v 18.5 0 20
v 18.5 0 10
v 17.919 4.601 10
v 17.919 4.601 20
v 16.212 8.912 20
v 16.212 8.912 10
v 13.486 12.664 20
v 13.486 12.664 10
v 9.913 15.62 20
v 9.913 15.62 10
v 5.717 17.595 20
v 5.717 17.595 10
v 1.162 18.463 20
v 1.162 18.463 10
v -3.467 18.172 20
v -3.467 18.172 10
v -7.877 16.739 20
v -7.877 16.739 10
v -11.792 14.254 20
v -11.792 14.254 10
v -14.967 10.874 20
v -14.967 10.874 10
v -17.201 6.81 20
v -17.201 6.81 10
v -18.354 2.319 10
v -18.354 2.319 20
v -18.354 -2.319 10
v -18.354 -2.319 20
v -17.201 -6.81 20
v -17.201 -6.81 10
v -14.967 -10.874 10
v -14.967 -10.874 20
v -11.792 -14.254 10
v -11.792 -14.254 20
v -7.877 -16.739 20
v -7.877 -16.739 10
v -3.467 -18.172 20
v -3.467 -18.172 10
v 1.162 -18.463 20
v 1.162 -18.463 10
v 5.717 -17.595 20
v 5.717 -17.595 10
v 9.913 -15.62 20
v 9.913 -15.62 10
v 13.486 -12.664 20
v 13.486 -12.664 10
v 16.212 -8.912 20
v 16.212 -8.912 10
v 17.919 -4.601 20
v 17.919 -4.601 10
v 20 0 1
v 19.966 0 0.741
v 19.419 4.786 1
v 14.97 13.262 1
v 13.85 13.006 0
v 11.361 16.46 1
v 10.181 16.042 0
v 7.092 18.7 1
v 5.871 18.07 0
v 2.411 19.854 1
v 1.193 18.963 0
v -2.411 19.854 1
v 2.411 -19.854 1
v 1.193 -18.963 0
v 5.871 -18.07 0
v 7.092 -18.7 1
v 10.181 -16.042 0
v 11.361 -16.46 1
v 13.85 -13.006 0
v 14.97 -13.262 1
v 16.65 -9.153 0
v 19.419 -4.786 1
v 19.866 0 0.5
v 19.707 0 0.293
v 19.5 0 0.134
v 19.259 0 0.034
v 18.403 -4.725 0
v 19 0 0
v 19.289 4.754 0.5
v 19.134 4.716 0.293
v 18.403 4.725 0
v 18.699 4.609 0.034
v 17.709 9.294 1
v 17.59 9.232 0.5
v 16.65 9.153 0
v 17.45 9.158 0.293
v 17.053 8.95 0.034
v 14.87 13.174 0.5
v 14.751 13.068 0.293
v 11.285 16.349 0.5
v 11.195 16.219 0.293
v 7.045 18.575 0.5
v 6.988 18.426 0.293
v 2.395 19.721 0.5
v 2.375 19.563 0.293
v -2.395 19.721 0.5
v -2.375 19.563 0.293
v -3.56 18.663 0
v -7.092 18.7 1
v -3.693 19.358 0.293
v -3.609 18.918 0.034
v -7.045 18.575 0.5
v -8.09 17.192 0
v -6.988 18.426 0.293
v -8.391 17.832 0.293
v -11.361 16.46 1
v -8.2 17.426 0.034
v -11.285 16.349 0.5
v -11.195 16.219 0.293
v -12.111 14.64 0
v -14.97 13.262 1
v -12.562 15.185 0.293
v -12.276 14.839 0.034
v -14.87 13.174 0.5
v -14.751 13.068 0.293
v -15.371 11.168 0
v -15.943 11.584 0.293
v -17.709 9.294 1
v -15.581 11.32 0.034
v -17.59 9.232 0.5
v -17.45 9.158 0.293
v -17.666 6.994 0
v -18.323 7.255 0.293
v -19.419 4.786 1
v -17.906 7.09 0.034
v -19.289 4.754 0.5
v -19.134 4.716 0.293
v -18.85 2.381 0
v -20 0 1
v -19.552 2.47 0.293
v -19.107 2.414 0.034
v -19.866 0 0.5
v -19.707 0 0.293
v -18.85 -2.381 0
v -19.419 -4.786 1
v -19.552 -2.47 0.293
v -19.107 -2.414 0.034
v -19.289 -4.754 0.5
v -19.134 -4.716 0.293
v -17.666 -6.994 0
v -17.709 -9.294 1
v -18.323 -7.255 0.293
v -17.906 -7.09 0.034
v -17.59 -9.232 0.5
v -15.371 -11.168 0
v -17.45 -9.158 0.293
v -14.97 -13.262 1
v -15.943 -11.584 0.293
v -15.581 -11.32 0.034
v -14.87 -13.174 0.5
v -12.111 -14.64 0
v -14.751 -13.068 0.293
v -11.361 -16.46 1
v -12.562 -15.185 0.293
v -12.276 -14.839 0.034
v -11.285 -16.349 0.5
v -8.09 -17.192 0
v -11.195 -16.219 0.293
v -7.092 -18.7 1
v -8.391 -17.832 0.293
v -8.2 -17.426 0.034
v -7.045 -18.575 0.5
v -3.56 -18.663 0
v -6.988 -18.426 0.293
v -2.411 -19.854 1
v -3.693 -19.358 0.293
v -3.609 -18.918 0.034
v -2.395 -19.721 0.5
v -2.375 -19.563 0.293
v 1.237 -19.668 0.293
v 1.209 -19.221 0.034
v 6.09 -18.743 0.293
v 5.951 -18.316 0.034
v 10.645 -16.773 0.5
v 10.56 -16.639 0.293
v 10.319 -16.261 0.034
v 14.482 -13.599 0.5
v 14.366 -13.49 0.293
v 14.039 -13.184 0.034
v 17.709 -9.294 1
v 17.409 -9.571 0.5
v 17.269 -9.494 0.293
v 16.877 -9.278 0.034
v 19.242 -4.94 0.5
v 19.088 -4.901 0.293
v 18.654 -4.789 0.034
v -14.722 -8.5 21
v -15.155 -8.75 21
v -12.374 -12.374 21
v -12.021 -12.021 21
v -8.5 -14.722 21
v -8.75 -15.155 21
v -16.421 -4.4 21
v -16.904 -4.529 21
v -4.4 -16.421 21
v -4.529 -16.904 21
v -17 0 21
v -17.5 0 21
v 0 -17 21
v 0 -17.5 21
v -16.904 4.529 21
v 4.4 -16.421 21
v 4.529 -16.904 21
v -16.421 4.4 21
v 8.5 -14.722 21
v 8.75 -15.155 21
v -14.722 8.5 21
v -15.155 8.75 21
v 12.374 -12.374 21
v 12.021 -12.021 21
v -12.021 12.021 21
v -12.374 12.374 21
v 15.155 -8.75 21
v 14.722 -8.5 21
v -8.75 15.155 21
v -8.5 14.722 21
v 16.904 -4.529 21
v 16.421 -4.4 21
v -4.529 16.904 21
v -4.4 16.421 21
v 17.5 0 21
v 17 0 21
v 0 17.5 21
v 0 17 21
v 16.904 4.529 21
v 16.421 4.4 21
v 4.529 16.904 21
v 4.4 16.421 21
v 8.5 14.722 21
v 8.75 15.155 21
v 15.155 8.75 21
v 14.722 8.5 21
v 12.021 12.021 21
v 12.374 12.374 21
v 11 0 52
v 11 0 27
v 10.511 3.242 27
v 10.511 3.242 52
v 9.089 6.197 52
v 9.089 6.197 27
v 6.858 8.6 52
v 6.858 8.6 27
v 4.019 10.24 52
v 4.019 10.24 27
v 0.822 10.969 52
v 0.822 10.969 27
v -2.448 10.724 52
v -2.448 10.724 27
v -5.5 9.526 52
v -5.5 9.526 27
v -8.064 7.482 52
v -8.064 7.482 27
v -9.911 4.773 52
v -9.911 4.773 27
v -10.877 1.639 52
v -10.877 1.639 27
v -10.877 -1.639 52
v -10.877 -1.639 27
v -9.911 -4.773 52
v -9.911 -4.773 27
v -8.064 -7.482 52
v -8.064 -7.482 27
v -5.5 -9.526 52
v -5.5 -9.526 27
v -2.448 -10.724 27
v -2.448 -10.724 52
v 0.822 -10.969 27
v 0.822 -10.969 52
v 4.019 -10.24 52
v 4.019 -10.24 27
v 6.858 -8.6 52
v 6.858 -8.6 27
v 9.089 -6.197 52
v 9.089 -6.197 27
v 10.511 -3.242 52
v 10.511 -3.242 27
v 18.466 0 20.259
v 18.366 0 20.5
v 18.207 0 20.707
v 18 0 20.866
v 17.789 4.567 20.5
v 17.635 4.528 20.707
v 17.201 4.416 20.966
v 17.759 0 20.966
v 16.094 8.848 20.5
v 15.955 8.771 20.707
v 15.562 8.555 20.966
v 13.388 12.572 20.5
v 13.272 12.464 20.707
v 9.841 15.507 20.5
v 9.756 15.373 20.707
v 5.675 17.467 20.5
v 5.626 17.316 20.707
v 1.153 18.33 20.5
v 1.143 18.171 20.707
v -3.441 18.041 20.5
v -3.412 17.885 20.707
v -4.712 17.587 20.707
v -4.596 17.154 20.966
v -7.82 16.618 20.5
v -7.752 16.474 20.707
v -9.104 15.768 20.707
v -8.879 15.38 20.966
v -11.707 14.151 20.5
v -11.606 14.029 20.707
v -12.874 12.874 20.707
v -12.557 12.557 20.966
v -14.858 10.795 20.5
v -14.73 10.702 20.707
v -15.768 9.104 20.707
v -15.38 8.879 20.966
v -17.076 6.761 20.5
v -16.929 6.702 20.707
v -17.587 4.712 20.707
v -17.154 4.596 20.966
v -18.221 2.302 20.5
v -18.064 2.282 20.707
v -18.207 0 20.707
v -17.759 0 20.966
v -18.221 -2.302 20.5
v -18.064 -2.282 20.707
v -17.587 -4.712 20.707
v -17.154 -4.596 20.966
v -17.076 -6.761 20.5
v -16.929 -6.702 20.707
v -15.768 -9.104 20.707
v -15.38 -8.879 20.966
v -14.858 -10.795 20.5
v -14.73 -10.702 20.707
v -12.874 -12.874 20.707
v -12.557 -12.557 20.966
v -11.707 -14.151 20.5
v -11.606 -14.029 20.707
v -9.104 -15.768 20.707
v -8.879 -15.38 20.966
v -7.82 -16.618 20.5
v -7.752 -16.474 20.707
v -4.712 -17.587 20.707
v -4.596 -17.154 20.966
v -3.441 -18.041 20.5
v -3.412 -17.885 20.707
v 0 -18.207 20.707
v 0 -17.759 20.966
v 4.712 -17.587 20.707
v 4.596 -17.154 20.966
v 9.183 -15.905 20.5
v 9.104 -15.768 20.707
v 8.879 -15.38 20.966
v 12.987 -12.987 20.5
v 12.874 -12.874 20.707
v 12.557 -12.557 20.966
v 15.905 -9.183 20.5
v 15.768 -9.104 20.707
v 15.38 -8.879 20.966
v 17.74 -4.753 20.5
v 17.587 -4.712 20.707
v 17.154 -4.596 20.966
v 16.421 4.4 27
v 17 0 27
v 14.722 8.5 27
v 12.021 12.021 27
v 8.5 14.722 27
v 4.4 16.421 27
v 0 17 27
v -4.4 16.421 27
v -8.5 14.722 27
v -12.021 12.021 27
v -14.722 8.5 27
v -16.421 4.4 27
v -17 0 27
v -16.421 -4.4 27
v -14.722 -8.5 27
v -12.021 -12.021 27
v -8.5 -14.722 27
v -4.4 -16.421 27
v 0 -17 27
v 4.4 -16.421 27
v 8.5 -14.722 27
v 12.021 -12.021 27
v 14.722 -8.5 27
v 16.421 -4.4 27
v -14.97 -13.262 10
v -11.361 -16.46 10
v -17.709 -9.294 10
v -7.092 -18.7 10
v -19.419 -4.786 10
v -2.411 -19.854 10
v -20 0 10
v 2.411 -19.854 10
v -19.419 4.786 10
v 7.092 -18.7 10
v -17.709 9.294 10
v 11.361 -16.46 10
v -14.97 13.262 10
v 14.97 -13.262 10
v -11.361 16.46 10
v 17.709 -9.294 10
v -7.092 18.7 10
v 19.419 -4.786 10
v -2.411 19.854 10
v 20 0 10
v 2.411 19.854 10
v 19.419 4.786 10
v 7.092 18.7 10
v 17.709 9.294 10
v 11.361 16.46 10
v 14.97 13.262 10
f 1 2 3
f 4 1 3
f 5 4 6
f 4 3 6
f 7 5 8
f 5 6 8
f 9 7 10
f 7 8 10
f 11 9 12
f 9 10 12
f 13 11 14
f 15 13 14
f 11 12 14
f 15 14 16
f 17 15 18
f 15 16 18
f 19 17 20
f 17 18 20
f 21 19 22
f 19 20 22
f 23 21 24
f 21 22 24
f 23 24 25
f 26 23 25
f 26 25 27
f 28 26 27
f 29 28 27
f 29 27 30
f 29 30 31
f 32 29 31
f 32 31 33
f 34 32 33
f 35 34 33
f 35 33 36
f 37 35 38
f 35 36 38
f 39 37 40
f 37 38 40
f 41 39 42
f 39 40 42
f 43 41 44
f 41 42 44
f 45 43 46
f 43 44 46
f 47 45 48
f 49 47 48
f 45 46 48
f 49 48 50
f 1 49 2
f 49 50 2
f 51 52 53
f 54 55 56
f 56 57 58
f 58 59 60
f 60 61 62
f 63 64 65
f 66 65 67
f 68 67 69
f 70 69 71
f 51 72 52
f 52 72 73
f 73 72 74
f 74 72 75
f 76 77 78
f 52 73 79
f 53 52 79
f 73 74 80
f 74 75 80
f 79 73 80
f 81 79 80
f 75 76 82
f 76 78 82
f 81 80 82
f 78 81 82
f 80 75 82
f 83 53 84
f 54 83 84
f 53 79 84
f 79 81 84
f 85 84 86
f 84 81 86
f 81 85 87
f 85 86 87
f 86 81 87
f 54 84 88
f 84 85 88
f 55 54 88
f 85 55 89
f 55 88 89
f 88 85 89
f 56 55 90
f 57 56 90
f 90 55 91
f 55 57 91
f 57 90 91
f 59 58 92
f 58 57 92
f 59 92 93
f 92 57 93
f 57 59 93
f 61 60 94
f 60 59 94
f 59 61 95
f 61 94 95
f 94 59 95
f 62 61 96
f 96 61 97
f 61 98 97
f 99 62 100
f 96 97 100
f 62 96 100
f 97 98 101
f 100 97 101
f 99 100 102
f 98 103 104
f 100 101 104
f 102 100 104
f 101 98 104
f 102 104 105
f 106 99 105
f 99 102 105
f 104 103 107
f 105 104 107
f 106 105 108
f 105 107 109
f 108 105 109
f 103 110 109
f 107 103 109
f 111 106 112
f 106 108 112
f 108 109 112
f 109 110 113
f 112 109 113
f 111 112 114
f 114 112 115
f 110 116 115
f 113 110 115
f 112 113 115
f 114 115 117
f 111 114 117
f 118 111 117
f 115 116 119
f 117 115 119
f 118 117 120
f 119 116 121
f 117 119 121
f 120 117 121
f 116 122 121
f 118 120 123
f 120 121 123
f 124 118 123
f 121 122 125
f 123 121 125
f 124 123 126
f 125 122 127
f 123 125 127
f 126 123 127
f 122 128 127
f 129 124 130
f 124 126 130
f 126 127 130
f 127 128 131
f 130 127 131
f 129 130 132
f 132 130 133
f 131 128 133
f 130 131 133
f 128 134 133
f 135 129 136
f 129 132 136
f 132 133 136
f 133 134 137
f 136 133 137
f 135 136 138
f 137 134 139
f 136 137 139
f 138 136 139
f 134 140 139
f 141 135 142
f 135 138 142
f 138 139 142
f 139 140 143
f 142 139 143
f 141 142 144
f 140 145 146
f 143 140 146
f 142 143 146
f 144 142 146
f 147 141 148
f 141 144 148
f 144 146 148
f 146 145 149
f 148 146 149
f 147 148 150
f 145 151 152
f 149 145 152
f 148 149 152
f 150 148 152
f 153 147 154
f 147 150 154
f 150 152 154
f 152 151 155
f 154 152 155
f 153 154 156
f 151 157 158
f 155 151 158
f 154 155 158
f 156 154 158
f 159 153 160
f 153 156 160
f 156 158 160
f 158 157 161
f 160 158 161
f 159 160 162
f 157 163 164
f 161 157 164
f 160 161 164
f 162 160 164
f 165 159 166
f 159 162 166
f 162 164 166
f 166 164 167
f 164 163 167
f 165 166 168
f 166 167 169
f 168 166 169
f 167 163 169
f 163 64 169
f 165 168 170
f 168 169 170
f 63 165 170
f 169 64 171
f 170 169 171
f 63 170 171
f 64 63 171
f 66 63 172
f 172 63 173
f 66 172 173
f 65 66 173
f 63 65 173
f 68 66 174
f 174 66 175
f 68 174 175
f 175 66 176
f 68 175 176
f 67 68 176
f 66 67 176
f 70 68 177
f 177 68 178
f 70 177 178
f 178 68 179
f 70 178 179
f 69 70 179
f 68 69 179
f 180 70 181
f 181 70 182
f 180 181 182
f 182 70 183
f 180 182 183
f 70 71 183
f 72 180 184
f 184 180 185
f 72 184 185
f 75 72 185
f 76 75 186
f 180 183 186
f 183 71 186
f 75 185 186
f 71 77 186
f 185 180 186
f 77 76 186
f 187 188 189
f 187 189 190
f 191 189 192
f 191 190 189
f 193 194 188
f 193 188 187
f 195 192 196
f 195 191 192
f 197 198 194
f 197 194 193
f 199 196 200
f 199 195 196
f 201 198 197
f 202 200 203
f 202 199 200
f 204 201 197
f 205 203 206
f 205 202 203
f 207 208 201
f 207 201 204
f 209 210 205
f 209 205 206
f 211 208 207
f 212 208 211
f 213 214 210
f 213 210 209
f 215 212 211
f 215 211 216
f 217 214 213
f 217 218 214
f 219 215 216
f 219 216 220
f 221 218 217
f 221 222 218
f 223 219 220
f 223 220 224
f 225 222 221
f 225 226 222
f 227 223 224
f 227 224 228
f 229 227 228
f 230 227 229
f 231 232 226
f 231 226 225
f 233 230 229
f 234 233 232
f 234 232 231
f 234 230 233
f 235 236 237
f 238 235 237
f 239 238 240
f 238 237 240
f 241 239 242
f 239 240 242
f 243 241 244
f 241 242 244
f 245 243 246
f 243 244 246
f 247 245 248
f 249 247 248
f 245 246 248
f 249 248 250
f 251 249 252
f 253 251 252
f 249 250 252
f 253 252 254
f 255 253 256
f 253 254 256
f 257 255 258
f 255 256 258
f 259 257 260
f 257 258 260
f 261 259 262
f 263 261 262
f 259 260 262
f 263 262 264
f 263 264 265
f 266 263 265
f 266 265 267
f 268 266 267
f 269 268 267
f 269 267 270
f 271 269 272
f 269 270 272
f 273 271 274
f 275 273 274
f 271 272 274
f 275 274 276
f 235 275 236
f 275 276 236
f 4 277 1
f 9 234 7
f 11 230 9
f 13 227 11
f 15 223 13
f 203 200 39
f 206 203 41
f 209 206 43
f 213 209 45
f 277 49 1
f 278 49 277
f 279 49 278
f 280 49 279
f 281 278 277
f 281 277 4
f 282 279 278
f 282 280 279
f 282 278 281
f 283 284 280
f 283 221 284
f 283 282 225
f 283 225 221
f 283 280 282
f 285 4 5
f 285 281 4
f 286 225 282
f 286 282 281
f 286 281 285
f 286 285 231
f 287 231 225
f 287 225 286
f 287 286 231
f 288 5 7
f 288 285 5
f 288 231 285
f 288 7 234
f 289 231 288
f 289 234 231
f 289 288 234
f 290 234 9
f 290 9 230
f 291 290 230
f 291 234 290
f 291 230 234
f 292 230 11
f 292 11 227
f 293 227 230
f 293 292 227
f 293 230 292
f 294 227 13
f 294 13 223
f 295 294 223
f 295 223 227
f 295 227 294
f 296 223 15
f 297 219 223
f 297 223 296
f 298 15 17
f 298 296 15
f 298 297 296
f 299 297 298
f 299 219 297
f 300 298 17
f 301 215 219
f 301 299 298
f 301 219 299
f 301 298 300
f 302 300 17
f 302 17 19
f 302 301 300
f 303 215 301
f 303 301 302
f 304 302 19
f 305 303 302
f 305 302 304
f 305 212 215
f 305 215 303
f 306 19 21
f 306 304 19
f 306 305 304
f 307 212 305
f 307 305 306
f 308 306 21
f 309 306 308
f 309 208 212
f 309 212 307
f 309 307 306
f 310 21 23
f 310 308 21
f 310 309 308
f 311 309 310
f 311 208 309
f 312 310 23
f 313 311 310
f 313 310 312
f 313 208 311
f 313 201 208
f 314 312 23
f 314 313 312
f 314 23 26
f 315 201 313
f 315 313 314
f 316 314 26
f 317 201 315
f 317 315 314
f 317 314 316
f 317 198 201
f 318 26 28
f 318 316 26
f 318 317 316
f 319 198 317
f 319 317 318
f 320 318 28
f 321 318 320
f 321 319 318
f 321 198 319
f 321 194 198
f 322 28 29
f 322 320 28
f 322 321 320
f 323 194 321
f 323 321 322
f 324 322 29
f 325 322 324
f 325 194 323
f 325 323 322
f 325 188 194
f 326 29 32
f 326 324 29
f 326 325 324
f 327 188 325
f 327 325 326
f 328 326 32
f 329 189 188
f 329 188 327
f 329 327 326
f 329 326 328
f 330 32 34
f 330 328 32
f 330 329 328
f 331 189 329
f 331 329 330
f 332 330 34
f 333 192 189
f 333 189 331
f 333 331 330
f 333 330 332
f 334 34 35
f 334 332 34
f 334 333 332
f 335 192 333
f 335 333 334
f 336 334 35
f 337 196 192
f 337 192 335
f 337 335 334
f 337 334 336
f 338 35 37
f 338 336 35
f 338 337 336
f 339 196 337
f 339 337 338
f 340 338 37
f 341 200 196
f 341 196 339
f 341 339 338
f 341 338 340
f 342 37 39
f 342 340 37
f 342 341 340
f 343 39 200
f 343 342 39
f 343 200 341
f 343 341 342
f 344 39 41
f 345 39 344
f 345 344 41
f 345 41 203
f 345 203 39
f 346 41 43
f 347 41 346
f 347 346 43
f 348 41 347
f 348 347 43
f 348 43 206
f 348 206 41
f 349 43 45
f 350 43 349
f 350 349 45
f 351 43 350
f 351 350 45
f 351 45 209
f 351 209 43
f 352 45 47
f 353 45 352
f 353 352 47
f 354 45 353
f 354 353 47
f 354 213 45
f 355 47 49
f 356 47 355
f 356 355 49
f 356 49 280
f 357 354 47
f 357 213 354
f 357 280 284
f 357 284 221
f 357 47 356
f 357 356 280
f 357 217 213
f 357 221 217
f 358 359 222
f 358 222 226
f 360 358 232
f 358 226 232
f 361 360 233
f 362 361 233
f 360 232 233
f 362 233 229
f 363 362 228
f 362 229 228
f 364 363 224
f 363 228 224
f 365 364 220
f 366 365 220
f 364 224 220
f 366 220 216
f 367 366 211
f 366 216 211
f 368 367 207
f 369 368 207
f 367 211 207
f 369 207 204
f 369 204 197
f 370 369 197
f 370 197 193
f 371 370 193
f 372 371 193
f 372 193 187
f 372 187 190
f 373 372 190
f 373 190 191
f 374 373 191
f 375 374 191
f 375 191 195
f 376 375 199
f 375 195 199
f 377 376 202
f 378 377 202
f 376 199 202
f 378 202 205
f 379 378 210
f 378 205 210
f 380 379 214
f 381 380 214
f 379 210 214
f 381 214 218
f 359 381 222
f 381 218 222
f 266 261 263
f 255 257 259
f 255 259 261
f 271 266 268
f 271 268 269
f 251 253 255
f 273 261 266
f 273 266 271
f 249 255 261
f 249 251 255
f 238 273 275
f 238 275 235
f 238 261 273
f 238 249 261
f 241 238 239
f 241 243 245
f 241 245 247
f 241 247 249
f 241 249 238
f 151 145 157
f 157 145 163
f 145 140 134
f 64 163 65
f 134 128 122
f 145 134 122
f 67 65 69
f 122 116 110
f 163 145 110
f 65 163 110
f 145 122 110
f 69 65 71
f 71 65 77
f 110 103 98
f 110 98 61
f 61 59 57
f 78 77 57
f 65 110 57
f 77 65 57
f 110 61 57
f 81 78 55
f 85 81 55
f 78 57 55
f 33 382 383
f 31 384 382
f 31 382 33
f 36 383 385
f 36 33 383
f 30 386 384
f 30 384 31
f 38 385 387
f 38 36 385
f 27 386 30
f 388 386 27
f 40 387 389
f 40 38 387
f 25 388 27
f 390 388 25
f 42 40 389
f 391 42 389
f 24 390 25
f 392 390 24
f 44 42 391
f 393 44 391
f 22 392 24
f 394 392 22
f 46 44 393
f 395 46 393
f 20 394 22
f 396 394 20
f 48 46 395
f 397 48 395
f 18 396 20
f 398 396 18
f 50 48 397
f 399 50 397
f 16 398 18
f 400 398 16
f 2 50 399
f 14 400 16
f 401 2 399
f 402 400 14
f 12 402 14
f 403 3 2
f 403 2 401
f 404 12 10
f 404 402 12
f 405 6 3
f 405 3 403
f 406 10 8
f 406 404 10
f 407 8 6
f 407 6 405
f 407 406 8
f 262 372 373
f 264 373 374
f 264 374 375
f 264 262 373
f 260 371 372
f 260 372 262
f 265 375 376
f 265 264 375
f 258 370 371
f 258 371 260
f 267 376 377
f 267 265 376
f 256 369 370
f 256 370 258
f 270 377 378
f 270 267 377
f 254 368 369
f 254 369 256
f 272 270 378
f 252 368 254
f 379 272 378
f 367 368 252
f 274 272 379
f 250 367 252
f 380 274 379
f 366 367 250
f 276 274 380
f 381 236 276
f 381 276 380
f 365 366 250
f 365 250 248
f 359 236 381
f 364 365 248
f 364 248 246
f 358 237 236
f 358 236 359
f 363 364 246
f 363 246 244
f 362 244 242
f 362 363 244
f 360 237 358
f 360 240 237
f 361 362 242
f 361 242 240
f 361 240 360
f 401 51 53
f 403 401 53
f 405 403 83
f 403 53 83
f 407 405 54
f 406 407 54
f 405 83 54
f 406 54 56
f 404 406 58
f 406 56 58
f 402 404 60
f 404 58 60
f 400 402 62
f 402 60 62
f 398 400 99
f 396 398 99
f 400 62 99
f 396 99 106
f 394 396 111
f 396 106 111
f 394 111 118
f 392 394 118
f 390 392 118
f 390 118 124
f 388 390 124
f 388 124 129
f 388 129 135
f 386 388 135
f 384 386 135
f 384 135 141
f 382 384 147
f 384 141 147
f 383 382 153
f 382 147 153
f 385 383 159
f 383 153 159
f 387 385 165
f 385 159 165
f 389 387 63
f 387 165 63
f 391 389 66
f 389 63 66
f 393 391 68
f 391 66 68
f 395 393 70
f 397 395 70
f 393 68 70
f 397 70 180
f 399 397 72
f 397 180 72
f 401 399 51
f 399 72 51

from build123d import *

# Parameters (mm, degrees)
SKETCH1_R           = 20
BOSS_EXTRUDE1_DEPTH = 10
SKETCH2_R           = 18.5
BOSS_EXTRUDE2_DEPTH = 11
SKETCH3_R           = 17
BOSS_EXTRUDE3_DEPTH = 6
SKETCH4_R           = 11
BOSS_EXTRUDE4_DEPTH = 25
FILLET1_R           = 1


with BuildPart() as part:
    # Sketch1 → Boss-Extrude1 (new body)
    with BuildSketch(Plane.XY):
        Circle(SKETCH1_R)
    extrude(amount=BOSS_EXTRUDE1_DEPTH)

    # Sketch2 → Boss-Extrude2 (add)
    with BuildSketch(Plane.XY.offset(10)):
        Circle(SKETCH2_R)
    extrude(amount=BOSS_EXTRUDE2_DEPTH)

    # Sketch3 → Boss-Extrude3 (add)
    with BuildSketch(Plane.XY.offset(21)):
        Circle(SKETCH3_R)
    extrude(amount=BOSS_EXTRUDE3_DEPTH)

    # Sketch4 → Boss-Extrude4 (add)
    with BuildSketch(Plane.XY.offset(27)):
        Circle(SKETCH4_R)
    extrude(amount=BOSS_EXTRUDE4_DEPTH)

    # Fillet1
    fillet1_edges = [part.edges().sort_by_distance(p)[0] for p in [
        (-20, 0, 0),
        (-18.5, 0, 21),
    ]]
    fillet(fillet1_edges, radius=FILLET1_R)


solid = part.part
